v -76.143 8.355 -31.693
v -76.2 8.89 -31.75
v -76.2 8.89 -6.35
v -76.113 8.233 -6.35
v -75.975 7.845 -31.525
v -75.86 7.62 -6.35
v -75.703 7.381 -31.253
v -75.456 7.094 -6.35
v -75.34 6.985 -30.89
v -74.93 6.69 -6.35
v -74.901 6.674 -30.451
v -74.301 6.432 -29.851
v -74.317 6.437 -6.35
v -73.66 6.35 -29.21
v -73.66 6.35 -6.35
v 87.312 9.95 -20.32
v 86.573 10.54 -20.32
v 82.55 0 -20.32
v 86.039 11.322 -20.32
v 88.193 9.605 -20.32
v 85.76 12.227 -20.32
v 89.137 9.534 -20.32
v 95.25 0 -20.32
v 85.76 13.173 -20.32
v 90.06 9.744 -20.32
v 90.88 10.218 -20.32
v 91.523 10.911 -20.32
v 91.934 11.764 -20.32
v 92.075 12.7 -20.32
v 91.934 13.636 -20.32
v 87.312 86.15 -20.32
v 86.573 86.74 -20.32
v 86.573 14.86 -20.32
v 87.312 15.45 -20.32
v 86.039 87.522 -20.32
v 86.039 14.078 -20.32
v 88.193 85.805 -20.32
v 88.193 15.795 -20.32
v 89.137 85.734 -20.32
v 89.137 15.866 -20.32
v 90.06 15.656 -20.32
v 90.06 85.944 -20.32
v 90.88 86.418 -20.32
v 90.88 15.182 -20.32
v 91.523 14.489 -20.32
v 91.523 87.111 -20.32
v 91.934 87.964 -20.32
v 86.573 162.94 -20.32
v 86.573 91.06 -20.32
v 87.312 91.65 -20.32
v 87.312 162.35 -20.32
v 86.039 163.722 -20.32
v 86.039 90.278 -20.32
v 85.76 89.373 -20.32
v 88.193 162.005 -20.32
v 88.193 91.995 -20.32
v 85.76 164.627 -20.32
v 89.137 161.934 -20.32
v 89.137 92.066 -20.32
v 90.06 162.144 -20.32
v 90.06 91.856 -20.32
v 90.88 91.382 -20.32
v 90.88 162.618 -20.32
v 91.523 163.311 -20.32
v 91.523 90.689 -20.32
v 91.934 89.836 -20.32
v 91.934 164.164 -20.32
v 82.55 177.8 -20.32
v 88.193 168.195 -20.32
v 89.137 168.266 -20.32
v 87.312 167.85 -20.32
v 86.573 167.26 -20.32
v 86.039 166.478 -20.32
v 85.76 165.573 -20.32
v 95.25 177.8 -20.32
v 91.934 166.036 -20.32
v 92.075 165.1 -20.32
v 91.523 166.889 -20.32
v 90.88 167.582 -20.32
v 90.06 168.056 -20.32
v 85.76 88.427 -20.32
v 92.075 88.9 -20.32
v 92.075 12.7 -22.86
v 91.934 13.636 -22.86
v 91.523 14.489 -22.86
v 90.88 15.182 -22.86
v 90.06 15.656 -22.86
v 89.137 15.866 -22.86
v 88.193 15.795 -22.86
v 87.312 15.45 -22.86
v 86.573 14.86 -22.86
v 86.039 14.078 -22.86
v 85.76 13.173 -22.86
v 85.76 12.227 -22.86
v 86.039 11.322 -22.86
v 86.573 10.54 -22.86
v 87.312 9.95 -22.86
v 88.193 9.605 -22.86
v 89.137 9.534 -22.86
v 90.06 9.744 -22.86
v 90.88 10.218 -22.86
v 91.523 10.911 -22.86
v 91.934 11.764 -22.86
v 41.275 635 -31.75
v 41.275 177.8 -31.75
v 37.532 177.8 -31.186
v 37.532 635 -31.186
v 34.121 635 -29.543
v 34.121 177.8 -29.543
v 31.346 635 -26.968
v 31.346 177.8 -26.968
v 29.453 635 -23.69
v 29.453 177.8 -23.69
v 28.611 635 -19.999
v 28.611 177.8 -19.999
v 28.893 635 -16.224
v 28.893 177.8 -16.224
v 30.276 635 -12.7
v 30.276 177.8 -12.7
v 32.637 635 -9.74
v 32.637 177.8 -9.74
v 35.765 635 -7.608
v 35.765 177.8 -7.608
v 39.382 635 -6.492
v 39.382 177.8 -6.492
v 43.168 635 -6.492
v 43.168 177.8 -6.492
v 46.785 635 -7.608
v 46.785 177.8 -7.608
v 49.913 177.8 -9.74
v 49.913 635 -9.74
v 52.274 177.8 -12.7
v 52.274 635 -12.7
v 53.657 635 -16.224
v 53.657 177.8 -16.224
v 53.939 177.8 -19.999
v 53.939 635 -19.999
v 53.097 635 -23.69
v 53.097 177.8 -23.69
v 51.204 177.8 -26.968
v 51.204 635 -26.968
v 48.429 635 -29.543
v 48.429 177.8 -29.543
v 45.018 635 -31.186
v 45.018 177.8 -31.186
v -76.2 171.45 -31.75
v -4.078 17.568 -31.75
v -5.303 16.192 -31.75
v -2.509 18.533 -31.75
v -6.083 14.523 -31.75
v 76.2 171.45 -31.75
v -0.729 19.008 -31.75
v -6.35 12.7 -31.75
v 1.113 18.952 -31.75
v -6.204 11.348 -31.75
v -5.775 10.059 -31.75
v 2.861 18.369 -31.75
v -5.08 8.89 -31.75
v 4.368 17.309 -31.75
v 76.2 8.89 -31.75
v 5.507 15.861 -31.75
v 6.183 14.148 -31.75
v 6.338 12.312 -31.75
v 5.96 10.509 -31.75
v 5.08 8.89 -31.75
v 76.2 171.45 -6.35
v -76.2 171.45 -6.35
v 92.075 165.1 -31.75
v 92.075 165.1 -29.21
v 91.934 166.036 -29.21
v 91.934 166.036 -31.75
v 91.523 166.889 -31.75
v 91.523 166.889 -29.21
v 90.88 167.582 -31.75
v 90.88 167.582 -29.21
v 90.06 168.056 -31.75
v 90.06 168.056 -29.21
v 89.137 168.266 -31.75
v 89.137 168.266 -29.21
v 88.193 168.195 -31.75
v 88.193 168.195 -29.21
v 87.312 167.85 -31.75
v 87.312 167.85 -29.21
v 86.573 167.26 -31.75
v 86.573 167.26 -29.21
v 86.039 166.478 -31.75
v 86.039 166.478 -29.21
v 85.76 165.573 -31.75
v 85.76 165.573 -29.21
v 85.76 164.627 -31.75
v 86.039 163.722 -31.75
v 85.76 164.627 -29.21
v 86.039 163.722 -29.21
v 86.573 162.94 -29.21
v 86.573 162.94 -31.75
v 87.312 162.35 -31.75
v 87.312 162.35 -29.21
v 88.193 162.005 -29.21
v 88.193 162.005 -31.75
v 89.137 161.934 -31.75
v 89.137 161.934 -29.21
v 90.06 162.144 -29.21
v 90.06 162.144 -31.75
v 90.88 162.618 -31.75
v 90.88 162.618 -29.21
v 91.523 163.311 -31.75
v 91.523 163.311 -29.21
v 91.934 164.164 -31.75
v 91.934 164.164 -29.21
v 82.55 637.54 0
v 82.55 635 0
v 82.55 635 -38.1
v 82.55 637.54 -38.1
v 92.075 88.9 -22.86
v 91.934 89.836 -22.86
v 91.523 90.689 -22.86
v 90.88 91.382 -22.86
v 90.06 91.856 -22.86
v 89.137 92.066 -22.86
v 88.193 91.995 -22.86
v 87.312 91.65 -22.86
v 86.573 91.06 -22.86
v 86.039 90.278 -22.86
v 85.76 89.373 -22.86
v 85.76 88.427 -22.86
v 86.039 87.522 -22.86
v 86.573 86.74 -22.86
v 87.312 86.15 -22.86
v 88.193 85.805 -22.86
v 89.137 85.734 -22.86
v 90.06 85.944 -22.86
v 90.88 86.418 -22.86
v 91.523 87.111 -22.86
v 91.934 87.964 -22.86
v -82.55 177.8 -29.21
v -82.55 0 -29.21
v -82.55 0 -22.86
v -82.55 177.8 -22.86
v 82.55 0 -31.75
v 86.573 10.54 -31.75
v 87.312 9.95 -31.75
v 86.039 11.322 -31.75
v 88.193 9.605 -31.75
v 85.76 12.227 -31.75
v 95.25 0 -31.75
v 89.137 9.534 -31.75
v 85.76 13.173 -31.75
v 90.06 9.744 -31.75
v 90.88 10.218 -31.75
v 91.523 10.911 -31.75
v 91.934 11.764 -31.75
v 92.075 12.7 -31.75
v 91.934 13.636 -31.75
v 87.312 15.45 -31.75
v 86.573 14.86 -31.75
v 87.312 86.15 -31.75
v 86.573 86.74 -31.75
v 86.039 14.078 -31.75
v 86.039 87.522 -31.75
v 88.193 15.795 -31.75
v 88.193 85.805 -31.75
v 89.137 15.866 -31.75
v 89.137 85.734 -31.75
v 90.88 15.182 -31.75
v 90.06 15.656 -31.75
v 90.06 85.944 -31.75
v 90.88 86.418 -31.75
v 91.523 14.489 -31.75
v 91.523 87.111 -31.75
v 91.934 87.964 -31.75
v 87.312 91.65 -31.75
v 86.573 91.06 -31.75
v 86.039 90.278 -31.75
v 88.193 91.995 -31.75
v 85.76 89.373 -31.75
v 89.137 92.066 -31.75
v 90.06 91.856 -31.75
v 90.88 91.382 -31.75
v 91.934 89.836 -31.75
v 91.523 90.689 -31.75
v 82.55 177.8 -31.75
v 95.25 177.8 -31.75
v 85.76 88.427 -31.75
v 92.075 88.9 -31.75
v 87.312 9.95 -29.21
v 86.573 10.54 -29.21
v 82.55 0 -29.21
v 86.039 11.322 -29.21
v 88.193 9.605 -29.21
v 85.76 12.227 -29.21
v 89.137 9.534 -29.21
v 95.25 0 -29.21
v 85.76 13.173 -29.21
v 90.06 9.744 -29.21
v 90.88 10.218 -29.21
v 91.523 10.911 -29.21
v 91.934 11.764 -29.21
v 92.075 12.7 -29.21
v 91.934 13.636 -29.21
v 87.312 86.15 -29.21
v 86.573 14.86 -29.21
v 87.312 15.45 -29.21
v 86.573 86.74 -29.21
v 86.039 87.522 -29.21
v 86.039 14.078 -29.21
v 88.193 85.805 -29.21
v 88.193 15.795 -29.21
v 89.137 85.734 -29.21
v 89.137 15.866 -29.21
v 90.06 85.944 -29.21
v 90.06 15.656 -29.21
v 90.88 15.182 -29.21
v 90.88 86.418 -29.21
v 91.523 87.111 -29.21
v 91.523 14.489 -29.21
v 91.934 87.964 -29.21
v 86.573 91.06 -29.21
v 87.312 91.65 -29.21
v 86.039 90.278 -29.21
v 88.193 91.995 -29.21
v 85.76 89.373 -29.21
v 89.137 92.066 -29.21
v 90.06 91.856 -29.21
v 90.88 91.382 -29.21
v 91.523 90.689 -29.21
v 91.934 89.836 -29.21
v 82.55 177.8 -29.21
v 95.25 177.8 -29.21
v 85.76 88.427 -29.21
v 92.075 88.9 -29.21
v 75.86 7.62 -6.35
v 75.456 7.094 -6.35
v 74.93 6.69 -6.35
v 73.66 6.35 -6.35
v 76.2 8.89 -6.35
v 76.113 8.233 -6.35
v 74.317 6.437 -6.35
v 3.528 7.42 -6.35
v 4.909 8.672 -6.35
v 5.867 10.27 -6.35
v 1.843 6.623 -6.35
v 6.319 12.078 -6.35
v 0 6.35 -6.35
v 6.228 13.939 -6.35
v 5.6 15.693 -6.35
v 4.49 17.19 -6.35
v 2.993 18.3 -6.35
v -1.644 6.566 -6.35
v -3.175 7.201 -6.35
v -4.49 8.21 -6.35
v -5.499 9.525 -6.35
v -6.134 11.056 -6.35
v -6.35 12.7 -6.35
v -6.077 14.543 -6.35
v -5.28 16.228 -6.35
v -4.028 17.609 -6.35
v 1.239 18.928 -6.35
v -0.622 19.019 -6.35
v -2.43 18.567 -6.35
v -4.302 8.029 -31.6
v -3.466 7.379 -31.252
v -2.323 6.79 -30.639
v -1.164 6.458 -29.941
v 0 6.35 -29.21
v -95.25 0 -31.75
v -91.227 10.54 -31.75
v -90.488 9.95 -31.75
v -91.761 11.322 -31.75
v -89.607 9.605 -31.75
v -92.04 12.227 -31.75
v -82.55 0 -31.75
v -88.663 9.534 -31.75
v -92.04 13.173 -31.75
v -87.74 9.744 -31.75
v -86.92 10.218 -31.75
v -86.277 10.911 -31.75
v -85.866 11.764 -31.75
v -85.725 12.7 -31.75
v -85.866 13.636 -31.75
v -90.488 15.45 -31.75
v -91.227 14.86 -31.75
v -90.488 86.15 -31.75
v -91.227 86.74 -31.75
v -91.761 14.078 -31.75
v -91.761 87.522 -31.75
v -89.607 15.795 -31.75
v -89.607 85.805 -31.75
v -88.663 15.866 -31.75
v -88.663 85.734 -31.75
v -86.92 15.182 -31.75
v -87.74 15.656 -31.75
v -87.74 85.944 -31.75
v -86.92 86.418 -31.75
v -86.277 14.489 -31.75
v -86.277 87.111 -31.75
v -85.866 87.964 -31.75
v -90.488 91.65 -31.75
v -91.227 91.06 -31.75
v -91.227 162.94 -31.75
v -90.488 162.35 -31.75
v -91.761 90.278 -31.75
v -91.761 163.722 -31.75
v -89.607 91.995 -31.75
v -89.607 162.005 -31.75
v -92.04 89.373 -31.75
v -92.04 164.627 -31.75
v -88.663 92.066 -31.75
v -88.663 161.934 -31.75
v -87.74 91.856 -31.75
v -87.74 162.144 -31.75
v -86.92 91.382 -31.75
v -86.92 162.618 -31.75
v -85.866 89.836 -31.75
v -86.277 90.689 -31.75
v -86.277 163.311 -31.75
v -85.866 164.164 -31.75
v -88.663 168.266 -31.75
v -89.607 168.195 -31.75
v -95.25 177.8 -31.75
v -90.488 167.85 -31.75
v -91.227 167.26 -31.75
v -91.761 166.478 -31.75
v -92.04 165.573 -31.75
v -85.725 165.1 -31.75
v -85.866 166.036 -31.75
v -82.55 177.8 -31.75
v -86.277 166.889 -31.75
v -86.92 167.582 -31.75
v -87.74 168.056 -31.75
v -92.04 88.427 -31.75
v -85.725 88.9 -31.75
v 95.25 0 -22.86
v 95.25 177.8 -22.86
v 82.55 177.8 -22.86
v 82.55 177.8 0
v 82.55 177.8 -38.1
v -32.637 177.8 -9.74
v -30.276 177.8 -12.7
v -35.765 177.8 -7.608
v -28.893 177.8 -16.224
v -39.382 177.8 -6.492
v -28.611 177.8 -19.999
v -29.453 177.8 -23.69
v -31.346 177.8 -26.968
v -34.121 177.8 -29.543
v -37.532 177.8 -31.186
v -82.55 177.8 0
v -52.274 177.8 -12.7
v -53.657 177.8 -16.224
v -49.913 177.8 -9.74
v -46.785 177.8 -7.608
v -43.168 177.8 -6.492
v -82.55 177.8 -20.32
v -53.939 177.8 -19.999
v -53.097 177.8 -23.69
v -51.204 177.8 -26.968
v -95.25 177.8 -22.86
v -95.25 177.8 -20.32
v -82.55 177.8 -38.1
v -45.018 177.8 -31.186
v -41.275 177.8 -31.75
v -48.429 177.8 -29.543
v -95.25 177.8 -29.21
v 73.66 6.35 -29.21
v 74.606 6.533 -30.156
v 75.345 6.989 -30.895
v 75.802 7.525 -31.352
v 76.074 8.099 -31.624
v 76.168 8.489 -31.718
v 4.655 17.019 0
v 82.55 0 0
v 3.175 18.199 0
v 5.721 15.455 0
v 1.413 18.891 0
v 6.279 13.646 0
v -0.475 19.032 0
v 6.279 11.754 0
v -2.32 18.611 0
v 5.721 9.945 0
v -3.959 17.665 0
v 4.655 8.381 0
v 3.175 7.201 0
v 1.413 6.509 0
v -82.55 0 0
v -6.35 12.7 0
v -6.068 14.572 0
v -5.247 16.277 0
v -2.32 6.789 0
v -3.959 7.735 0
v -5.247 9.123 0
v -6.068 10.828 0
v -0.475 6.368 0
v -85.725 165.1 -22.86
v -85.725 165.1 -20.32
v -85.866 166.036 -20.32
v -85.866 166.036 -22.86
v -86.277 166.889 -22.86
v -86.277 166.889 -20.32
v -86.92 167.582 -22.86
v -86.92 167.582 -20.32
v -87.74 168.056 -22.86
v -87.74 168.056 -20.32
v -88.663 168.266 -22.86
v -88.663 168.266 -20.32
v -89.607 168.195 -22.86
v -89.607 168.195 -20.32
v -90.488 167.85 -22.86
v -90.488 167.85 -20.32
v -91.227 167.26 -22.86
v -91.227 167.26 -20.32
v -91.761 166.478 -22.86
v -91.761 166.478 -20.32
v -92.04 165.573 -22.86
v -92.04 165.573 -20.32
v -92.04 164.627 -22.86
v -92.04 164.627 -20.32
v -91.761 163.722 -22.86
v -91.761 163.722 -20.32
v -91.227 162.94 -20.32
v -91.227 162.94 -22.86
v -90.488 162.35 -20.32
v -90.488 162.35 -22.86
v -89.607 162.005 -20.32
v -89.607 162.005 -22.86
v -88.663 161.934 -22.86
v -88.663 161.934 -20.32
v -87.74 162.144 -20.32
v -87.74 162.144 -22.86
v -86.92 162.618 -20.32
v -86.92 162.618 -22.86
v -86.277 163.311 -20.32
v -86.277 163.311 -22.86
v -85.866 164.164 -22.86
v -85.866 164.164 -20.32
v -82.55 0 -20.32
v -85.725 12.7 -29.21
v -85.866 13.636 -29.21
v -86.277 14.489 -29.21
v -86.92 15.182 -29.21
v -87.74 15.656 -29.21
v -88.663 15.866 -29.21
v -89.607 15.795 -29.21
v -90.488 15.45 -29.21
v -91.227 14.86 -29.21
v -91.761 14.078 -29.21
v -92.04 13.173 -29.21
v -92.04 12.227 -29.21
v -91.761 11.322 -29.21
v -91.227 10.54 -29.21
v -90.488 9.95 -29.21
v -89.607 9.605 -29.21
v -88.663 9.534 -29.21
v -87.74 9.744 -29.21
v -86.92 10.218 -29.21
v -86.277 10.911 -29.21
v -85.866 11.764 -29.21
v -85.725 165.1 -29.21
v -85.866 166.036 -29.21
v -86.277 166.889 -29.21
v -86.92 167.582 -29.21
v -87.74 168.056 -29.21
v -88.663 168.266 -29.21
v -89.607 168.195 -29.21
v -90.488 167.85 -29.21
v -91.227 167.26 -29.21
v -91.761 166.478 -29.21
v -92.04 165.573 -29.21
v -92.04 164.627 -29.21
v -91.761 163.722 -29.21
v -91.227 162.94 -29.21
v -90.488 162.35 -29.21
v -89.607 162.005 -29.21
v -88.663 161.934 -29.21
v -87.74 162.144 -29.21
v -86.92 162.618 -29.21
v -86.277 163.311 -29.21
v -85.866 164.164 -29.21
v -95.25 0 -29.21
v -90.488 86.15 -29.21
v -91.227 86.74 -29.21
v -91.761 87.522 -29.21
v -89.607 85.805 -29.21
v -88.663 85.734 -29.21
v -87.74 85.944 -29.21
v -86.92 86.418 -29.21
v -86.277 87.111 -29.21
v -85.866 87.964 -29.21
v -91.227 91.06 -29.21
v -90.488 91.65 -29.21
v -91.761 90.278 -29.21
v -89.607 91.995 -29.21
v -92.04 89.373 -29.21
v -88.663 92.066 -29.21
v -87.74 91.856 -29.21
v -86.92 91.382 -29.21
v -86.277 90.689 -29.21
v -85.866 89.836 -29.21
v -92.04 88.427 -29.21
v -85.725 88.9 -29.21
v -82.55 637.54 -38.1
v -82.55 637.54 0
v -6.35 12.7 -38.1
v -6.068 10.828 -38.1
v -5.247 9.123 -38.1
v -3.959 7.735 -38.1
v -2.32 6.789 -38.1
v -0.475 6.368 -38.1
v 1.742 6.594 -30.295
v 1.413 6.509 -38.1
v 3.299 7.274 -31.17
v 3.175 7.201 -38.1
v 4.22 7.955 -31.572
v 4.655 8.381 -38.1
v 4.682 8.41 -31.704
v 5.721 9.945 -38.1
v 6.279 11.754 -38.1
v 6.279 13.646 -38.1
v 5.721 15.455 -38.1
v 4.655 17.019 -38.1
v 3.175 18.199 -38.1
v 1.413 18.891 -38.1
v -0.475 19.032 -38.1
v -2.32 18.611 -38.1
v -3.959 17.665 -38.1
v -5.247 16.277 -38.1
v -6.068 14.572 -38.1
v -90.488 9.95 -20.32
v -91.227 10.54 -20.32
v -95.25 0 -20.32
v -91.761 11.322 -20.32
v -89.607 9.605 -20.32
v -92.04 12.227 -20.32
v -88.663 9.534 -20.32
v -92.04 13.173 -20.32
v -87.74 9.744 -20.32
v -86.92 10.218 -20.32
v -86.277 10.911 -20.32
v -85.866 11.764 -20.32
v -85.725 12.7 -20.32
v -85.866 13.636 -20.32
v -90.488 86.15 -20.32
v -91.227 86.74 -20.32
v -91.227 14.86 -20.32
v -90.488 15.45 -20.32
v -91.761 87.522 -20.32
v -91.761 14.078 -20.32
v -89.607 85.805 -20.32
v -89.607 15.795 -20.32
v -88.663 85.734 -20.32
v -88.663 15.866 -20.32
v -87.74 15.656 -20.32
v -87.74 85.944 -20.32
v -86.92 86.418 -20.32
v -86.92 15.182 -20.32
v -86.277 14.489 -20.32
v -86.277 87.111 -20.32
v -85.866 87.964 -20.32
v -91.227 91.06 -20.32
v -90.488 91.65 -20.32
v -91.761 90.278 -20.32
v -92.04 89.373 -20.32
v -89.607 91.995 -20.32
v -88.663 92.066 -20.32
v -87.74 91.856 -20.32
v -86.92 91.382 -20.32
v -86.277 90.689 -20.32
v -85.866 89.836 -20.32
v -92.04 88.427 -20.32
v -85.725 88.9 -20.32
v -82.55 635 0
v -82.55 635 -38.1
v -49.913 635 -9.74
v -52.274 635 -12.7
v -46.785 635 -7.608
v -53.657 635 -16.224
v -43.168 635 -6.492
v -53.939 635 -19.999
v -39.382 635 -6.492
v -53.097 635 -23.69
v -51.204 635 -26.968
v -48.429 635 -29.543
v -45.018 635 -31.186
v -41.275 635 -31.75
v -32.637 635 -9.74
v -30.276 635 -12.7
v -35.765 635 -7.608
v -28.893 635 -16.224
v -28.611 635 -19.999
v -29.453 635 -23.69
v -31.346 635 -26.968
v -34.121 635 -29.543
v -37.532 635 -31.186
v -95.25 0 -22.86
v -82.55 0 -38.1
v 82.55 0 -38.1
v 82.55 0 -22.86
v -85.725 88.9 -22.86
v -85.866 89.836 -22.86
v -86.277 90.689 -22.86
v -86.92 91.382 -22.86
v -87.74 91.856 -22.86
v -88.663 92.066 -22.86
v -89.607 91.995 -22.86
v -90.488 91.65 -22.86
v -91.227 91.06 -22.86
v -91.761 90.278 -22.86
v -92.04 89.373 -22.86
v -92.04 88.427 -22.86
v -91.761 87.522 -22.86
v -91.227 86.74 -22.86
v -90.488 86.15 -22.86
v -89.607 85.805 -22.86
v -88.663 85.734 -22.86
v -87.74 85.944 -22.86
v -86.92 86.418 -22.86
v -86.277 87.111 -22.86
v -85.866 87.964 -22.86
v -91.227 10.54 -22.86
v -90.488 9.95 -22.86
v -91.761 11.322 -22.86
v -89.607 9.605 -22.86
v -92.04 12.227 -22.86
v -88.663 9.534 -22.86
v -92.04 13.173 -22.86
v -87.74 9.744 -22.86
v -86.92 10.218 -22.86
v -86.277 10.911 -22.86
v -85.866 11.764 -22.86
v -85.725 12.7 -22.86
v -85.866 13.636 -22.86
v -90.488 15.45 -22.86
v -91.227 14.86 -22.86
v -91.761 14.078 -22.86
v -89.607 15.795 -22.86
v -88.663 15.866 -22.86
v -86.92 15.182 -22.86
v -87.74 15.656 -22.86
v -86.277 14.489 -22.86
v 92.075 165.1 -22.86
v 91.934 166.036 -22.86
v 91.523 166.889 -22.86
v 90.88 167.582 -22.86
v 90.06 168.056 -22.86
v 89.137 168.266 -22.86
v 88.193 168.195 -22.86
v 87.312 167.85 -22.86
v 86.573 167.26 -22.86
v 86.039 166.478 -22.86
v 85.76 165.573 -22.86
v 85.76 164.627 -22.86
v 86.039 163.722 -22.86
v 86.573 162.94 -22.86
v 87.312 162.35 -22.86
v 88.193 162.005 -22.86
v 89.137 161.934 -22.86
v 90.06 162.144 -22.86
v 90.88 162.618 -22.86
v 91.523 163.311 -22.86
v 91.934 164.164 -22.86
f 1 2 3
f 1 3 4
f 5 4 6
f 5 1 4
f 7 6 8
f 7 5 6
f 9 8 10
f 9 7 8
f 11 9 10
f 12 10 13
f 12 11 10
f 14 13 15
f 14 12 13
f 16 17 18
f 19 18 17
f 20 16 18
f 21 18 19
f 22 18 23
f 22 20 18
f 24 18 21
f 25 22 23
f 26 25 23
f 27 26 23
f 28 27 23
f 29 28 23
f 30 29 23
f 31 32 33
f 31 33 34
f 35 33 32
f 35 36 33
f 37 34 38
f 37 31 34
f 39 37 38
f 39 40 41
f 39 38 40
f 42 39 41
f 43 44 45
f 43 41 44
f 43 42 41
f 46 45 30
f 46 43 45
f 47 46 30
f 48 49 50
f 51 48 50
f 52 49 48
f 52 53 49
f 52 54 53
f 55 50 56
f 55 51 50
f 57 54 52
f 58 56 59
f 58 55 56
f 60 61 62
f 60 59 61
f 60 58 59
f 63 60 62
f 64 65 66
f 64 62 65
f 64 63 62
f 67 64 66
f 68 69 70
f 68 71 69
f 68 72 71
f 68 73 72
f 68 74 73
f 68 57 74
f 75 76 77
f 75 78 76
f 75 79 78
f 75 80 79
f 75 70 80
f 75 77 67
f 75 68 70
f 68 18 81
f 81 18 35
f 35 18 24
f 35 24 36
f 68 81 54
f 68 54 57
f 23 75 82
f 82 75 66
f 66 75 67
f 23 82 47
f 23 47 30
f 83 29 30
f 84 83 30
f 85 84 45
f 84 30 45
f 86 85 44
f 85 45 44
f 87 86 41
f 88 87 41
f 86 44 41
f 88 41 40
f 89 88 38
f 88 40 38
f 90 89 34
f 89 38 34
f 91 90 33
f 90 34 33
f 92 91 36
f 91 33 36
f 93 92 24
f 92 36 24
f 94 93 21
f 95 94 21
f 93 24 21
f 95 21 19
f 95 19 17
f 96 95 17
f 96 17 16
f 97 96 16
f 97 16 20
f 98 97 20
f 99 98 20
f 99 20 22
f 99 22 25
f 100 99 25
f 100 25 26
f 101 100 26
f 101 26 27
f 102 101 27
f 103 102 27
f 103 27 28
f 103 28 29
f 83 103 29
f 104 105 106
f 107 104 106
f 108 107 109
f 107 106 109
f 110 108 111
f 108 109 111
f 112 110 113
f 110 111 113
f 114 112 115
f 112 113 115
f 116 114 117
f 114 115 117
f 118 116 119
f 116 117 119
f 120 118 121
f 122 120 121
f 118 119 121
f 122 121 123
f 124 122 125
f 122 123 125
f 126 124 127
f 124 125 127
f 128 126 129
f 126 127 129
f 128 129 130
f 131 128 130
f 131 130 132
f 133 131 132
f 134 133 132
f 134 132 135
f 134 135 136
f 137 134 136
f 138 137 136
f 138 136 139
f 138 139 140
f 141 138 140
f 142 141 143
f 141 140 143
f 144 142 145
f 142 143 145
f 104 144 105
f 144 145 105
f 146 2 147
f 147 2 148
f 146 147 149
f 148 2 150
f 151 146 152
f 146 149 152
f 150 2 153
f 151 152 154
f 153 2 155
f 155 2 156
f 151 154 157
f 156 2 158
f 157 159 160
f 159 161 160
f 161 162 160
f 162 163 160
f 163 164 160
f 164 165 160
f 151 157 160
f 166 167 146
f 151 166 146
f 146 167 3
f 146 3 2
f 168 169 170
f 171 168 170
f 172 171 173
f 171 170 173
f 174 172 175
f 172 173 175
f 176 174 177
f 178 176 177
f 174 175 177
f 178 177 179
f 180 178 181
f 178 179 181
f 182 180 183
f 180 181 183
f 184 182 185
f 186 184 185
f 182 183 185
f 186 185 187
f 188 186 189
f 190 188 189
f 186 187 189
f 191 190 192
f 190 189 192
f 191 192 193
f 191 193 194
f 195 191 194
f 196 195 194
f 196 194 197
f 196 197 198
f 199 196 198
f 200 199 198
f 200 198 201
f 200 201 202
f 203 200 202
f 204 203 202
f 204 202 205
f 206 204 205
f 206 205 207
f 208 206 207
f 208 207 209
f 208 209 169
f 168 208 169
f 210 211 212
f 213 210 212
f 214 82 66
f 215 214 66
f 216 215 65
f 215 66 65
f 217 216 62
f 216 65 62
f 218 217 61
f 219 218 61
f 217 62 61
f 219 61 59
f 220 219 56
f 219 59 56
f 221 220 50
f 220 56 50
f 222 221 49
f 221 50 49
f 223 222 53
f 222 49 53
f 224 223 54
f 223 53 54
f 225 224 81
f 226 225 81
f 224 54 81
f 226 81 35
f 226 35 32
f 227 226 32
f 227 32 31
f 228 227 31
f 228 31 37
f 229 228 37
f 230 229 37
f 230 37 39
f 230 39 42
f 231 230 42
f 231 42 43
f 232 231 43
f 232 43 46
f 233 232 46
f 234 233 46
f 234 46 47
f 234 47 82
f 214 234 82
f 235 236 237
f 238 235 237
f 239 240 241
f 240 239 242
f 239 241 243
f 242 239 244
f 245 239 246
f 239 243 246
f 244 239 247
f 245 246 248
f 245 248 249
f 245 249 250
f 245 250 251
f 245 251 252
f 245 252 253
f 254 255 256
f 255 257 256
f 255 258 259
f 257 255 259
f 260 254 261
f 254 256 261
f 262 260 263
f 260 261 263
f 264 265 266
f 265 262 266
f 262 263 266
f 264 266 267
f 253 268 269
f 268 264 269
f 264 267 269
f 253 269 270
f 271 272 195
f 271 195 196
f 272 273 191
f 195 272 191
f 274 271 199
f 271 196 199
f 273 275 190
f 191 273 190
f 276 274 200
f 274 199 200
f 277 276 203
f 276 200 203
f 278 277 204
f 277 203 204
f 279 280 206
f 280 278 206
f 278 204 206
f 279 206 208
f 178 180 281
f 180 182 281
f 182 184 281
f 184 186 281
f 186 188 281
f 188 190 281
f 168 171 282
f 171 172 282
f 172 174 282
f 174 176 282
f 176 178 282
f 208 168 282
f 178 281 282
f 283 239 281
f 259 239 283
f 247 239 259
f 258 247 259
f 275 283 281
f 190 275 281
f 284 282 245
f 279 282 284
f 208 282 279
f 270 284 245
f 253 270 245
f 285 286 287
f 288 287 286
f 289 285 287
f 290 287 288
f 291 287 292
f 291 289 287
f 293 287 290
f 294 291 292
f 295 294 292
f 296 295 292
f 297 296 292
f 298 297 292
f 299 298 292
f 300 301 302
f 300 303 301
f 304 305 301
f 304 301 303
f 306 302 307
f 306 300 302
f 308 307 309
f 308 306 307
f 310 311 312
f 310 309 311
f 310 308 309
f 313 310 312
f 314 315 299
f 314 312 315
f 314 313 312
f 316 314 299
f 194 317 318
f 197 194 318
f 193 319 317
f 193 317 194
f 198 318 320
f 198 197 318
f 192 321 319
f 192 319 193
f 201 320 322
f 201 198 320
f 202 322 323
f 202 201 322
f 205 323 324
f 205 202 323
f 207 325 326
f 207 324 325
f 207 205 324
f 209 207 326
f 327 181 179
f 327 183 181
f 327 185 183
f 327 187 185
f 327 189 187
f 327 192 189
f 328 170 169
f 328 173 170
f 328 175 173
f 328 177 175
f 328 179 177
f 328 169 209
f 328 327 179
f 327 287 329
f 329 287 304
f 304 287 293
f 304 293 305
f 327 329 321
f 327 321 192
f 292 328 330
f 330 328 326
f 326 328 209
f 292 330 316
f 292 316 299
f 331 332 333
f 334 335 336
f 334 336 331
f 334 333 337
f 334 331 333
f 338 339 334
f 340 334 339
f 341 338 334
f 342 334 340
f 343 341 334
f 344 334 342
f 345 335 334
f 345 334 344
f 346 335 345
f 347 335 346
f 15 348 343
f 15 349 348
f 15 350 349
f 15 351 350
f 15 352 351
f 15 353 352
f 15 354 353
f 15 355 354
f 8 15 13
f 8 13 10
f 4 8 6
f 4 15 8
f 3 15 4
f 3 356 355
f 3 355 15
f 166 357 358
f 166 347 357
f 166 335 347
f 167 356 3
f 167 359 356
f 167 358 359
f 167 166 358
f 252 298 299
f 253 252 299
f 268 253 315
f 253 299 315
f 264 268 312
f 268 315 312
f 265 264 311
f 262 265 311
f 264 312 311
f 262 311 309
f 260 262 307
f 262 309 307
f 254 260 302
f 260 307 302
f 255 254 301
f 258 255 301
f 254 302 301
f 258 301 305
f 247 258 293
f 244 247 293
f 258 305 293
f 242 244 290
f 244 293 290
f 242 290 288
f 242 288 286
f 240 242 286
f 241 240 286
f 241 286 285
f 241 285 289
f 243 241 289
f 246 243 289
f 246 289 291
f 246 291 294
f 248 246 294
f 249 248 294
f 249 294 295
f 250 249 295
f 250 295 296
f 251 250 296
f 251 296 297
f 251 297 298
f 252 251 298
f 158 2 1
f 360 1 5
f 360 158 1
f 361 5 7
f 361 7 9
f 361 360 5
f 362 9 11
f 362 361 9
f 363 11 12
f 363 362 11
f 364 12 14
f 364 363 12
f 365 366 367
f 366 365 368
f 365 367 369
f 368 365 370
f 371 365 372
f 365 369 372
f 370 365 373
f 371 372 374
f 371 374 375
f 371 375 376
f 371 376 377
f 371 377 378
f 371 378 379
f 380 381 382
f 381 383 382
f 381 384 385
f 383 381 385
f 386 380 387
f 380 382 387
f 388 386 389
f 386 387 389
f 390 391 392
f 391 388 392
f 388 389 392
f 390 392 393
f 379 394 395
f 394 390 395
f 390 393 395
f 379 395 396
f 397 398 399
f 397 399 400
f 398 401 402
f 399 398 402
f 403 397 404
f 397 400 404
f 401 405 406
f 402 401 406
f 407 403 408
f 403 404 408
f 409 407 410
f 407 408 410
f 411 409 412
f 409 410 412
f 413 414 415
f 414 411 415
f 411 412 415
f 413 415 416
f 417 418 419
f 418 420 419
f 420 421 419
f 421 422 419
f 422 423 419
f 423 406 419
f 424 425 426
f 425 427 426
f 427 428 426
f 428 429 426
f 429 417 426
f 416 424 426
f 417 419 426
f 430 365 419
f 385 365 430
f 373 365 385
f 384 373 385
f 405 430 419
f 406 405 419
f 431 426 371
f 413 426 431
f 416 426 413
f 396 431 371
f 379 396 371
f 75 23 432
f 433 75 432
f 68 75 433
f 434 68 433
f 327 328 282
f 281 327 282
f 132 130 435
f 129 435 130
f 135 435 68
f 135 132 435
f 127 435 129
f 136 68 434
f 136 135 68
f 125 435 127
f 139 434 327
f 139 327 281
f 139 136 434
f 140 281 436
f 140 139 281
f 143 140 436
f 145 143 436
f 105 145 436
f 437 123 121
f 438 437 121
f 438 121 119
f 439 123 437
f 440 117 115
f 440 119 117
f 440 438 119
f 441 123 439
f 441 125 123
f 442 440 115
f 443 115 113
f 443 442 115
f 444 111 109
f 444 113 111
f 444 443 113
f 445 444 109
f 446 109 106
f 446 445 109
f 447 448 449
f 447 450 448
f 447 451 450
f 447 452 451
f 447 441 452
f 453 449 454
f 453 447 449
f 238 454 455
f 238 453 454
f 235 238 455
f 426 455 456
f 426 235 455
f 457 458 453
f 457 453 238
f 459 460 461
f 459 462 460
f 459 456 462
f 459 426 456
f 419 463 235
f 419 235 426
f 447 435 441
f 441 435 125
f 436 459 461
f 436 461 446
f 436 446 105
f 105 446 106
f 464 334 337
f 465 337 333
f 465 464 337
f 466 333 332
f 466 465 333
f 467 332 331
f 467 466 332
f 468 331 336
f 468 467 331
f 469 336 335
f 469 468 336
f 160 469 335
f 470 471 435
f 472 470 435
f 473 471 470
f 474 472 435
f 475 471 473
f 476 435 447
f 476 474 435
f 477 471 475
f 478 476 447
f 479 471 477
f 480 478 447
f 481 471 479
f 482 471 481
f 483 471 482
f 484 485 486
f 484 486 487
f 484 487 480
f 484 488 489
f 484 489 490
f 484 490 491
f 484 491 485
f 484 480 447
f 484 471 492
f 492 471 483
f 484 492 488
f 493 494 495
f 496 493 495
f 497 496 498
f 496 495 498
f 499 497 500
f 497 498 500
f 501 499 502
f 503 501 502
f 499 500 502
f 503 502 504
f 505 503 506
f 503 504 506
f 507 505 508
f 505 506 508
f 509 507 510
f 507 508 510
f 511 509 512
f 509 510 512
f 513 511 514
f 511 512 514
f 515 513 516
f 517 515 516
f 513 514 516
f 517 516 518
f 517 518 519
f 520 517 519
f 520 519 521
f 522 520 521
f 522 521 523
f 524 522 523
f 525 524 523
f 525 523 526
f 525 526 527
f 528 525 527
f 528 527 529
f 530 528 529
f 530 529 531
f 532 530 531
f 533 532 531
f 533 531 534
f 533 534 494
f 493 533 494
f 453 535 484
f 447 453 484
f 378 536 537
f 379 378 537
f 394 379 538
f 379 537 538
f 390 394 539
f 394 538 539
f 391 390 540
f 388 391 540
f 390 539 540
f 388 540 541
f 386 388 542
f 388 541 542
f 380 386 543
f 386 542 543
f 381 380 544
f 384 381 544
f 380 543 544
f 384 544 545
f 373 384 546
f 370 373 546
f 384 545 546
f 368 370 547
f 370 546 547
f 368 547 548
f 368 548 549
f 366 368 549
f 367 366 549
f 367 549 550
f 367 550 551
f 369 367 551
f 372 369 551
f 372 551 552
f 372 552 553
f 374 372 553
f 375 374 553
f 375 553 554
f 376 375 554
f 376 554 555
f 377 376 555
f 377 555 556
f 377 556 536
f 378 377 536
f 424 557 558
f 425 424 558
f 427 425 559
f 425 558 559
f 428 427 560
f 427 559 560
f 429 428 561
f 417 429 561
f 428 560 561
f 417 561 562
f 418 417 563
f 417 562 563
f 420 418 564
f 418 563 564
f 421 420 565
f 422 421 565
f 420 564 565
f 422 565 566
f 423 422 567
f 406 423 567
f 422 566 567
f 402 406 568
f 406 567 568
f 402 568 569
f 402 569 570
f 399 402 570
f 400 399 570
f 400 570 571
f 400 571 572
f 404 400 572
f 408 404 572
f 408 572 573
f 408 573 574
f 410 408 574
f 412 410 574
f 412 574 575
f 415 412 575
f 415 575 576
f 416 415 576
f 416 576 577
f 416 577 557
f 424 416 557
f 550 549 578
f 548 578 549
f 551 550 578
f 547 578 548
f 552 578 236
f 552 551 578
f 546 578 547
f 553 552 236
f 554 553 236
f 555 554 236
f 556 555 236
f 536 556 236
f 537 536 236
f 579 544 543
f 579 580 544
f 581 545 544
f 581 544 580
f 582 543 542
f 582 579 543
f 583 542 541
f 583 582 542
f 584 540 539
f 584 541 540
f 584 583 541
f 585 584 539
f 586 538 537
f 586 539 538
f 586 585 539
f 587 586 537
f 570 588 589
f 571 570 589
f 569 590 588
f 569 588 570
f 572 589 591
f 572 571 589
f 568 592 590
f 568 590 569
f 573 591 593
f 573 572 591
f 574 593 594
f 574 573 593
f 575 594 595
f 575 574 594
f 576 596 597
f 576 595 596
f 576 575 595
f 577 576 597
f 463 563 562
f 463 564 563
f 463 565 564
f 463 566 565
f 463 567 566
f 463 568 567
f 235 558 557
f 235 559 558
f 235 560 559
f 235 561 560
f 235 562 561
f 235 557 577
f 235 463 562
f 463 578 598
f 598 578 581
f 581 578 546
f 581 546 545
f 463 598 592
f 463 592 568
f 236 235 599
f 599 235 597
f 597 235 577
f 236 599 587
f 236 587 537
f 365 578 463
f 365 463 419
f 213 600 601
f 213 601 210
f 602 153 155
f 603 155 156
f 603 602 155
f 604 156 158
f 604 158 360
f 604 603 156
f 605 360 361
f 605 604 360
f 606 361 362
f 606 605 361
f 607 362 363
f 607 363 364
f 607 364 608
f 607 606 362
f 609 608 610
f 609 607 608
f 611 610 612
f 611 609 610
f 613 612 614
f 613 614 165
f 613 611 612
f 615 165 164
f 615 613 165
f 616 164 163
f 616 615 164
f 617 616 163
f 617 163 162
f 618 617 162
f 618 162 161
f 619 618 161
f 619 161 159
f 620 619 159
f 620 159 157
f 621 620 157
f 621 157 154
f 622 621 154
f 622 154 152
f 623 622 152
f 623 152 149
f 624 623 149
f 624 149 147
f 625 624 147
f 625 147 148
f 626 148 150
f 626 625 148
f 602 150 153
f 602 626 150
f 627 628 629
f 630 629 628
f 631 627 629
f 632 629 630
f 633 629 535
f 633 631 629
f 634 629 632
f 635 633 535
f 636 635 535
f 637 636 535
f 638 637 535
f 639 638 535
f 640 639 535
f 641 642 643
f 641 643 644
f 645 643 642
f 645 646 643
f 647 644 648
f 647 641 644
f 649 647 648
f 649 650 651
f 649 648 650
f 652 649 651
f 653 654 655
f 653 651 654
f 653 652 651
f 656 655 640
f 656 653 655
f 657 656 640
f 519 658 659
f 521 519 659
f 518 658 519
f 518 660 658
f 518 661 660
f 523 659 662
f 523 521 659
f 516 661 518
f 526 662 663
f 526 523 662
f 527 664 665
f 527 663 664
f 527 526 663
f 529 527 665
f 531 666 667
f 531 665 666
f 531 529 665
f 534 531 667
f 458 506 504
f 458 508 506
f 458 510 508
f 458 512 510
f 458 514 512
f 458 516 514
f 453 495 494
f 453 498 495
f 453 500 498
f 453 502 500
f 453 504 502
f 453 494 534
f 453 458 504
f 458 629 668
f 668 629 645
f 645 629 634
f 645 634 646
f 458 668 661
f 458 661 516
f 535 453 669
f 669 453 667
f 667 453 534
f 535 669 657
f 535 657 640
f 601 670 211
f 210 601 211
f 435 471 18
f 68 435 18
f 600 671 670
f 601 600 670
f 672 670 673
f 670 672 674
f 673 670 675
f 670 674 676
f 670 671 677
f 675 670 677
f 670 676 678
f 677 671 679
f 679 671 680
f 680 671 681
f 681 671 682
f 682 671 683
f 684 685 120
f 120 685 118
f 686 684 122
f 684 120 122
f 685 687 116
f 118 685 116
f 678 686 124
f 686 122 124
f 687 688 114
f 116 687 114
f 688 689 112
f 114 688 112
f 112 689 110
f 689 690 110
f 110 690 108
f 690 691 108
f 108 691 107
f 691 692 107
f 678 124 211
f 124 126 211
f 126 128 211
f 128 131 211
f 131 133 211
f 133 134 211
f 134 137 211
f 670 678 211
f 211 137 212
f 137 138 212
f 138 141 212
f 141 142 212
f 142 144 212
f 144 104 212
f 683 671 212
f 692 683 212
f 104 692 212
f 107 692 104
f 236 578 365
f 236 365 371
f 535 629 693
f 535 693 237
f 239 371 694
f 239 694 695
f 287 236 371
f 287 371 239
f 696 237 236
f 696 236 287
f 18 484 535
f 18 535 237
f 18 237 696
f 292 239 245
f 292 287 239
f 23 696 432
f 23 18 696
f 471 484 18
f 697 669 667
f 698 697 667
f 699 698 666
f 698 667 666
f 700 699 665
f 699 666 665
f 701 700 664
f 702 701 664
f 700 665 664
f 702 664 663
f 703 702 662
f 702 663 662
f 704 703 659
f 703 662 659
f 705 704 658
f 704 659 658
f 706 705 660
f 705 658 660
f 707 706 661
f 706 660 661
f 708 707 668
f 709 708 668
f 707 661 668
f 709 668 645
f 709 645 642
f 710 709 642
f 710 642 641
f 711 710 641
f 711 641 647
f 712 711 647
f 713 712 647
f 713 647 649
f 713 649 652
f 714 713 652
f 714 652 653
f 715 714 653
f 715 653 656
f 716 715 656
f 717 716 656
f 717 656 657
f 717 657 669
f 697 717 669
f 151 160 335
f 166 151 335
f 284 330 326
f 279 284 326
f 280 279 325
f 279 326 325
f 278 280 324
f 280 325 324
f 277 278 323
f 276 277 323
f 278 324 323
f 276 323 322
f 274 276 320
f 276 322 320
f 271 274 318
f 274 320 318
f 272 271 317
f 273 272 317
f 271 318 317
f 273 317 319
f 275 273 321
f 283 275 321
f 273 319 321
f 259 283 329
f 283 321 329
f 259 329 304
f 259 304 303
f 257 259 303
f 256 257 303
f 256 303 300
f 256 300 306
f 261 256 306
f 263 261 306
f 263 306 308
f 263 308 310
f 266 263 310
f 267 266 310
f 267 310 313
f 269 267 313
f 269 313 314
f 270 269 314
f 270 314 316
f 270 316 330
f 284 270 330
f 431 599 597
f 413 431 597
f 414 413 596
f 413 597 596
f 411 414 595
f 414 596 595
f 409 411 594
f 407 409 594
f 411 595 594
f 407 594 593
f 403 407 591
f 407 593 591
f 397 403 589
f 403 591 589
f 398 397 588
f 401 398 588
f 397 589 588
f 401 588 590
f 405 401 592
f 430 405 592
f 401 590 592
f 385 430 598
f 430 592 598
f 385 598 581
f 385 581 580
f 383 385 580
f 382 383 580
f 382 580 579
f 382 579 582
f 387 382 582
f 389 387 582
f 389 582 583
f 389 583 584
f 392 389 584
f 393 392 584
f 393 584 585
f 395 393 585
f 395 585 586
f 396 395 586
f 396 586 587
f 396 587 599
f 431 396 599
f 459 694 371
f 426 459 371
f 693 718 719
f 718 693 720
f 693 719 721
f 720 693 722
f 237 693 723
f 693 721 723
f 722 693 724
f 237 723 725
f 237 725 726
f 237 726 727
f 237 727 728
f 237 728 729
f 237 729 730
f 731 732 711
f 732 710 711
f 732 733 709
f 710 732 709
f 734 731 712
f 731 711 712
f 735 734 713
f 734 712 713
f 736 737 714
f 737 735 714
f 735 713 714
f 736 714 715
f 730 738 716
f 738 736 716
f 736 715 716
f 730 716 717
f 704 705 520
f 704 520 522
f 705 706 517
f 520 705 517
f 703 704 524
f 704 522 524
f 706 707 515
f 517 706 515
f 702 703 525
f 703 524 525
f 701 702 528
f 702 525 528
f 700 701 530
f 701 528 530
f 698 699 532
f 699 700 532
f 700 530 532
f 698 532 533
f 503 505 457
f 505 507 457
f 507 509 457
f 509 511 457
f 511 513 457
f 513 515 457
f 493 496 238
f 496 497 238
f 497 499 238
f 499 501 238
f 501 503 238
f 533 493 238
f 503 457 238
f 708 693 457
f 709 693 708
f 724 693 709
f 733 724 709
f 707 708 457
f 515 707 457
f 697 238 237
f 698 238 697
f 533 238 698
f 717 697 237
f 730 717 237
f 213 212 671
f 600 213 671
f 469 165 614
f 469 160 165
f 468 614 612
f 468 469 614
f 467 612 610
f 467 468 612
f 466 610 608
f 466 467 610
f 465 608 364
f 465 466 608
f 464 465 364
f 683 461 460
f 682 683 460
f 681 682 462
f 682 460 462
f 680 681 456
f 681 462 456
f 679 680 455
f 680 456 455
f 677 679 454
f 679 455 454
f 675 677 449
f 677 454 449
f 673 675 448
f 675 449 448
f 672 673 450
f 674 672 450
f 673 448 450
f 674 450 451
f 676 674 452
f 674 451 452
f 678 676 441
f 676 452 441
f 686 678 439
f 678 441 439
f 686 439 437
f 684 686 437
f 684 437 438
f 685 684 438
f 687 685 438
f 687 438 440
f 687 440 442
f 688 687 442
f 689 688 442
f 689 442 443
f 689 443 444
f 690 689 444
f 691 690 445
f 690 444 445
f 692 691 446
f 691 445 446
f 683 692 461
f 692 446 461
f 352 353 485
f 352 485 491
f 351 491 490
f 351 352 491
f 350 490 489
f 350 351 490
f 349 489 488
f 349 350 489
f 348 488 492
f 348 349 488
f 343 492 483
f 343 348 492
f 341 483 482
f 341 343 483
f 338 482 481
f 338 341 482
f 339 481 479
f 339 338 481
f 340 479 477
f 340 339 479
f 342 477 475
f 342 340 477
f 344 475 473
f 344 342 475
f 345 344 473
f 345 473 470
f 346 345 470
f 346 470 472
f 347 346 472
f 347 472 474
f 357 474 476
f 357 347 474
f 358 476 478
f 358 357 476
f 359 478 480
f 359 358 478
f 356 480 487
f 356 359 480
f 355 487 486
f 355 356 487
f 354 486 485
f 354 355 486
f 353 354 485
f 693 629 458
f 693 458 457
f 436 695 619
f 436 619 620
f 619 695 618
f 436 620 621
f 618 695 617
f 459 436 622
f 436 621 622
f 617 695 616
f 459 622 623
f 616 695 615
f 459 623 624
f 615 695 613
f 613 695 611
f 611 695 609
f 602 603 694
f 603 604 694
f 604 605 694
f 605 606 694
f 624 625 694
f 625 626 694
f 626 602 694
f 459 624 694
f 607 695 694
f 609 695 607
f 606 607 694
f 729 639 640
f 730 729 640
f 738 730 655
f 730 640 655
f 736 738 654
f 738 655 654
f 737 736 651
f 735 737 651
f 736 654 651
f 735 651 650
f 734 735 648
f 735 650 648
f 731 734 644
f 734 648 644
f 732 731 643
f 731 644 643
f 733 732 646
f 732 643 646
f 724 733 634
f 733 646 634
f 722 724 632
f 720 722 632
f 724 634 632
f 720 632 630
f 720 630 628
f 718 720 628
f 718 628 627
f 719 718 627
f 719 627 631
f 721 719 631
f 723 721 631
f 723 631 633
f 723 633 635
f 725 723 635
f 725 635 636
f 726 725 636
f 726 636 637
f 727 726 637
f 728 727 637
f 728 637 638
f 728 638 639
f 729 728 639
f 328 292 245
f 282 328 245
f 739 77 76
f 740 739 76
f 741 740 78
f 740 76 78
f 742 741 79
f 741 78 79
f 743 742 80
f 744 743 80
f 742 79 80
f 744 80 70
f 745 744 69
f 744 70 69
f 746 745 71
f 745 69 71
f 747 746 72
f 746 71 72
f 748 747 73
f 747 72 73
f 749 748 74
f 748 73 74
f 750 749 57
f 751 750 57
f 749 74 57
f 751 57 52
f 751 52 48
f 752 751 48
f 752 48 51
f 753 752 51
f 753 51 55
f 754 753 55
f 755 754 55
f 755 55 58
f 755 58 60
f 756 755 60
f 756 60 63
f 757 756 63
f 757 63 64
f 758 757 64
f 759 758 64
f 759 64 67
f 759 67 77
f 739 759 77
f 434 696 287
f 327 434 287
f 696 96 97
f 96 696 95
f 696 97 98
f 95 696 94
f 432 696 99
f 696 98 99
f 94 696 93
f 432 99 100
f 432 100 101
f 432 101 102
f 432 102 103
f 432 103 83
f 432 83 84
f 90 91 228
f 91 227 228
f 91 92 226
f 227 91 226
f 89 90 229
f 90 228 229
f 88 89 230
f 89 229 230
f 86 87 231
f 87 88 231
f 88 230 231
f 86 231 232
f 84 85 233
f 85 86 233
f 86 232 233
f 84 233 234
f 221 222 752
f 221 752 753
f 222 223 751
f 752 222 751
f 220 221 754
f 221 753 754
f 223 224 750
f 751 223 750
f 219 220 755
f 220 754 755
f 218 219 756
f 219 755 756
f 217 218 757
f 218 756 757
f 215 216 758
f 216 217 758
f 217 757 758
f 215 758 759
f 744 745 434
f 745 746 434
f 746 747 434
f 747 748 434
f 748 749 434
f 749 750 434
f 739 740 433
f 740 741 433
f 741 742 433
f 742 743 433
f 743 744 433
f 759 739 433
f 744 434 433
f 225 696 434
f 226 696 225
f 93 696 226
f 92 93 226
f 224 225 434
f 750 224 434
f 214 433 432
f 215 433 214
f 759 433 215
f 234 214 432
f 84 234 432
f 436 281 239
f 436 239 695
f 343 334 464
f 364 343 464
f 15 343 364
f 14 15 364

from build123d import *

# Parameters (mm, degrees)
BOSS_EXTRUDE1_DEPTH = 177.8
SKETCH2_W           = 12.7
SKETCH2_H           = 2.54
BOSS_EXTRUDE2_DEPTH = 177.8
SKETCH3_R           = 3.175
CUT_EXTRUDE1_DEPTH  = 203.727168628
SKETCH4_W           = 31.75
SKETCH4_H           = 6.35
BOSS_EXTRUDE3_DEPTH = 152.4
FILLET1_R           = 2.54
BOSS_EXTRUDE4_REACH = 251.919
SKETCH5_W           = 31.75
SKETCH5_H           = 6.35
BOSS_EXTRUDE5_DEPTH = 6.35
SKETCH7_W           = 25.4
SKETCH7_H           = 6.35
BOSS_EXTRUDE6_DEPTH = 12.7
SKETCH8_W           = 12.7
SKETCH8_H           = 6.35
REVOLVE1_ANGLE      = 180
SKETCH10_R          = 6.35
CUT_EXTRUDE2_DEPTH  = 206.273019416
SKETCH11_R          = 12.7
BOSS_EXTRUDE7_DEPTH = 457.2
BOSS_EXTRUDE8_DEPTH = 2.54
CUT_EXTRUDE3_DEPTH  = 646.740988406


with BuildPart() as part:
    # Sketch1 → Boss-Extrude1 (new body)
    with BuildSketch(Plane(origin=(0, 0, 0), x_dir=(1, 0, 0), z_dir=(0, 1, 0))):
        Polygon((76.2, 0), (82.55, 0), (82.55, 38.1), (-82.55, 38.1), (-82.55, 0), (-76.2, 0), (-76.2, 31.75), (76.2, 31.75), align=None)
    extrude(amount=BOSS_EXTRUDE1_DEPTH)

    # Sketch2 → Boss-Extrude2 (add)
    with BuildSketch(Plane(origin=(0, 177.8, 0), x_dir=(1, 0, 0), z_dir=(0, 1, 0))):
        with Locations((88.9, 30.48)):
            Rectangle(SKETCH2_W, SKETCH2_H)
        with Locations((88.9, 21.59)):
            Rectangle(SKETCH2_W, SKETCH2_H)
        with Locations((-88.9, 21.59)):
            Rectangle(SKETCH2_W, SKETCH2_H)
        with Locations((-88.9, 30.48)):
            Rectangle(SKETCH2_W, SKETCH2_H)
    extrude(amount=-BOSS_EXTRUDE2_DEPTH)

    # Sketch3 → Cut-Extrude1 (cut, through all)
    with BuildSketch(Plane.XY.offset(-20.32)):
        with Locations((88.9, 12.7)):
            Circle(SKETCH3_R)
        with Locations((88.9, 88.9)):
            Circle(SKETCH3_R)
        with Locations((88.9, 165.1)):
            Circle(SKETCH3_R)
        with Locations((-88.9, 12.7)):
            Circle(SKETCH3_R)
        with Locations((-88.9, 165.1)):
            Circle(SKETCH3_R)
        with Locations((-88.9, 88.9)):
            Circle(SKETCH3_R)
    extrude(amount=-CUT_EXTRUDE1_DEPTH, mode=Mode.SUBTRACT)

    # Sketch4 → Boss-Extrude3 (add)
    with BuildSketch(Plane(origin=(-76.2, 0, 0), x_dir=(0, 0, -1), z_dir=(1, 0, 0))):
        with Locations((15.875, 3.175)):
            Rectangle(SKETCH4_W, SKETCH4_H)
    extrude(amount=BOSS_EXTRUDE3_DEPTH)

    # Fillet1
    fillet1_edges = [part.edges().sort_by_distance(p)[0] for p in [
        (76.2, 6.35, -15.875),
        (0, 6.35, -31.75),
        (-76.2, 6.35, -15.875),
    ]]
    fillet(fillet1_edges, radius=FILLET1_R)

    # Sketch5 → Boss-Extrude4 (add, up to next)
    with BuildSketch(Plane(origin=(-76.2, 0, 0), x_dir=(0, 0, -1), z_dir=(1, 0, 0)), mode=Mode.PRIVATE) as boss_extrude4_sk1:
        with Locations((15.875, 174.625)):
            Rectangle(SKETCH5_W, SKETCH5_H)
    boss_extrude4_tool1 = extrude(boss_extrude4_sk1.sketch, amount=BOSS_EXTRUDE4_REACH, mode=Mode.PRIVATE) - part.part
    add(boss_extrude4_tool1.solids().sort_by_distance((-76.2, 174.625, -15.875))[0])

    # Sketch6 → Boss-Extrude5 (add)
    with BuildSketch(Plane.XY):
        with BuildLine():
            Line((76.2, 171.45), (76.2, 8.89))
            ThreePointArc((76.2, 8.89), (75.456051224, 7.093948776), (73.66, 6.35))
            Line((73.66, 6.35), (-73.66, 6.35))
            ThreePointArc((-73.66, 6.35), (-75.456051224, 7.093948776), (-76.2, 8.89))
            Line((-76.2, 8.89), (-76.2, 171.45))
            Line((-76.2, 171.45), (76.2, 171.45))
        make_face()
    extrude(amount=-BOSS_EXTRUDE5_DEPTH)

    # Sketch7 → Boss-Extrude6 (add)
    with BuildSketch(Plane.XZ):
        with Locations((0, -3.175)):
            Rectangle(SKETCH7_W, SKETCH7_H)
        with Locations((0, -34.925)):
            Rectangle(SKETCH7_W, SKETCH7_H)
    extrude(amount=BOSS_EXTRUDE6_DEPTH)

    # Sketch8 → Revolve1 (revolve)
    with BuildSketch(Plane.XZ.offset(12.7)):
        with Locations((6.35, -3.175)):
            Rectangle(SKETCH8_W, SKETCH8_H)
        with Locations((6.35, -34.925)):
            Rectangle(SKETCH8_W, SKETCH8_H)
    revolve(axis=Axis((0, -12.7, 0), (0, 0, -1)), revolution_arc=REVOLVE1_ANGLE)

    # Sketch10 → Cut-Extrude2 (cut, through all)
    with BuildSketch(Plane(origin=(0, 0, -38.1), x_dir=(-1, 0, 0), z_dir=(0, 0, -1))):
        with Locations((0, -12.7)):
            Circle(SKETCH10_R)
    cut_extrude2 = extrude(amount=-CUT_EXTRUDE2_DEPTH, mode=Mode.SUBTRACT)

    # Sketch11 → Boss-Extrude7 (add)
    with BuildSketch(Plane(origin=(0, 177.8, 0), x_dir=(1, 0, 0), z_dir=(0, 1, 0))):
        with Locations(Location((-41.275, 19.05, 0), (0, 0, 90))):
            Circle(SKETCH11_R)
        with Locations(Location((41.275, 19.05, 0), (0, 0, 90))):
            Circle(SKETCH11_R)
    extrude(amount=BOSS_EXTRUDE7_DEPTH)

    # Sketch12 → Boss-Extrude8 (add)
    with BuildSketch(Plane(origin=(0, 635, 0), x_dir=(1, 0, 0), z_dir=(0, 1, 0))):
        Polygon((82.55, 0), (82.55, 20.32), (82.55, 22.86), (82.55, 29.21), (82.55, 31.75), (82.55, 38.1), (-82.55, 38.1), (-82.55, 31.75), (-82.55, 29.21), (-82.55, 22.86), (-82.55, 20.32), (-82.55, 0), align=None)
    extrude(amount=BOSS_EXTRUDE8_DEPTH)

    # Mirror1: Cut-Extrude2 across plane
    add(cut_extrude2.mirror(Plane.ZX), mode=Mode.SUBTRACT)

    # Sketch13 → Cut-Extrude3 (cut, through all)
    with BuildSketch(Plane.XY):
        with BuildLine():
            Line((-12.7, 0), (12.7, 0))
            Line((12.7, 0), (12.7, -12.7))
            ThreePointArc((12.7, -12.7), (0, -25.4), (-12.7, -12.7))
            Line((-12.7, -12.7), (-12.7, 0))
        make_face()
    extrude(amount=-CUT_EXTRUDE3_DEPTH, mode=Mode.SUBTRACT)


solid = part.part
